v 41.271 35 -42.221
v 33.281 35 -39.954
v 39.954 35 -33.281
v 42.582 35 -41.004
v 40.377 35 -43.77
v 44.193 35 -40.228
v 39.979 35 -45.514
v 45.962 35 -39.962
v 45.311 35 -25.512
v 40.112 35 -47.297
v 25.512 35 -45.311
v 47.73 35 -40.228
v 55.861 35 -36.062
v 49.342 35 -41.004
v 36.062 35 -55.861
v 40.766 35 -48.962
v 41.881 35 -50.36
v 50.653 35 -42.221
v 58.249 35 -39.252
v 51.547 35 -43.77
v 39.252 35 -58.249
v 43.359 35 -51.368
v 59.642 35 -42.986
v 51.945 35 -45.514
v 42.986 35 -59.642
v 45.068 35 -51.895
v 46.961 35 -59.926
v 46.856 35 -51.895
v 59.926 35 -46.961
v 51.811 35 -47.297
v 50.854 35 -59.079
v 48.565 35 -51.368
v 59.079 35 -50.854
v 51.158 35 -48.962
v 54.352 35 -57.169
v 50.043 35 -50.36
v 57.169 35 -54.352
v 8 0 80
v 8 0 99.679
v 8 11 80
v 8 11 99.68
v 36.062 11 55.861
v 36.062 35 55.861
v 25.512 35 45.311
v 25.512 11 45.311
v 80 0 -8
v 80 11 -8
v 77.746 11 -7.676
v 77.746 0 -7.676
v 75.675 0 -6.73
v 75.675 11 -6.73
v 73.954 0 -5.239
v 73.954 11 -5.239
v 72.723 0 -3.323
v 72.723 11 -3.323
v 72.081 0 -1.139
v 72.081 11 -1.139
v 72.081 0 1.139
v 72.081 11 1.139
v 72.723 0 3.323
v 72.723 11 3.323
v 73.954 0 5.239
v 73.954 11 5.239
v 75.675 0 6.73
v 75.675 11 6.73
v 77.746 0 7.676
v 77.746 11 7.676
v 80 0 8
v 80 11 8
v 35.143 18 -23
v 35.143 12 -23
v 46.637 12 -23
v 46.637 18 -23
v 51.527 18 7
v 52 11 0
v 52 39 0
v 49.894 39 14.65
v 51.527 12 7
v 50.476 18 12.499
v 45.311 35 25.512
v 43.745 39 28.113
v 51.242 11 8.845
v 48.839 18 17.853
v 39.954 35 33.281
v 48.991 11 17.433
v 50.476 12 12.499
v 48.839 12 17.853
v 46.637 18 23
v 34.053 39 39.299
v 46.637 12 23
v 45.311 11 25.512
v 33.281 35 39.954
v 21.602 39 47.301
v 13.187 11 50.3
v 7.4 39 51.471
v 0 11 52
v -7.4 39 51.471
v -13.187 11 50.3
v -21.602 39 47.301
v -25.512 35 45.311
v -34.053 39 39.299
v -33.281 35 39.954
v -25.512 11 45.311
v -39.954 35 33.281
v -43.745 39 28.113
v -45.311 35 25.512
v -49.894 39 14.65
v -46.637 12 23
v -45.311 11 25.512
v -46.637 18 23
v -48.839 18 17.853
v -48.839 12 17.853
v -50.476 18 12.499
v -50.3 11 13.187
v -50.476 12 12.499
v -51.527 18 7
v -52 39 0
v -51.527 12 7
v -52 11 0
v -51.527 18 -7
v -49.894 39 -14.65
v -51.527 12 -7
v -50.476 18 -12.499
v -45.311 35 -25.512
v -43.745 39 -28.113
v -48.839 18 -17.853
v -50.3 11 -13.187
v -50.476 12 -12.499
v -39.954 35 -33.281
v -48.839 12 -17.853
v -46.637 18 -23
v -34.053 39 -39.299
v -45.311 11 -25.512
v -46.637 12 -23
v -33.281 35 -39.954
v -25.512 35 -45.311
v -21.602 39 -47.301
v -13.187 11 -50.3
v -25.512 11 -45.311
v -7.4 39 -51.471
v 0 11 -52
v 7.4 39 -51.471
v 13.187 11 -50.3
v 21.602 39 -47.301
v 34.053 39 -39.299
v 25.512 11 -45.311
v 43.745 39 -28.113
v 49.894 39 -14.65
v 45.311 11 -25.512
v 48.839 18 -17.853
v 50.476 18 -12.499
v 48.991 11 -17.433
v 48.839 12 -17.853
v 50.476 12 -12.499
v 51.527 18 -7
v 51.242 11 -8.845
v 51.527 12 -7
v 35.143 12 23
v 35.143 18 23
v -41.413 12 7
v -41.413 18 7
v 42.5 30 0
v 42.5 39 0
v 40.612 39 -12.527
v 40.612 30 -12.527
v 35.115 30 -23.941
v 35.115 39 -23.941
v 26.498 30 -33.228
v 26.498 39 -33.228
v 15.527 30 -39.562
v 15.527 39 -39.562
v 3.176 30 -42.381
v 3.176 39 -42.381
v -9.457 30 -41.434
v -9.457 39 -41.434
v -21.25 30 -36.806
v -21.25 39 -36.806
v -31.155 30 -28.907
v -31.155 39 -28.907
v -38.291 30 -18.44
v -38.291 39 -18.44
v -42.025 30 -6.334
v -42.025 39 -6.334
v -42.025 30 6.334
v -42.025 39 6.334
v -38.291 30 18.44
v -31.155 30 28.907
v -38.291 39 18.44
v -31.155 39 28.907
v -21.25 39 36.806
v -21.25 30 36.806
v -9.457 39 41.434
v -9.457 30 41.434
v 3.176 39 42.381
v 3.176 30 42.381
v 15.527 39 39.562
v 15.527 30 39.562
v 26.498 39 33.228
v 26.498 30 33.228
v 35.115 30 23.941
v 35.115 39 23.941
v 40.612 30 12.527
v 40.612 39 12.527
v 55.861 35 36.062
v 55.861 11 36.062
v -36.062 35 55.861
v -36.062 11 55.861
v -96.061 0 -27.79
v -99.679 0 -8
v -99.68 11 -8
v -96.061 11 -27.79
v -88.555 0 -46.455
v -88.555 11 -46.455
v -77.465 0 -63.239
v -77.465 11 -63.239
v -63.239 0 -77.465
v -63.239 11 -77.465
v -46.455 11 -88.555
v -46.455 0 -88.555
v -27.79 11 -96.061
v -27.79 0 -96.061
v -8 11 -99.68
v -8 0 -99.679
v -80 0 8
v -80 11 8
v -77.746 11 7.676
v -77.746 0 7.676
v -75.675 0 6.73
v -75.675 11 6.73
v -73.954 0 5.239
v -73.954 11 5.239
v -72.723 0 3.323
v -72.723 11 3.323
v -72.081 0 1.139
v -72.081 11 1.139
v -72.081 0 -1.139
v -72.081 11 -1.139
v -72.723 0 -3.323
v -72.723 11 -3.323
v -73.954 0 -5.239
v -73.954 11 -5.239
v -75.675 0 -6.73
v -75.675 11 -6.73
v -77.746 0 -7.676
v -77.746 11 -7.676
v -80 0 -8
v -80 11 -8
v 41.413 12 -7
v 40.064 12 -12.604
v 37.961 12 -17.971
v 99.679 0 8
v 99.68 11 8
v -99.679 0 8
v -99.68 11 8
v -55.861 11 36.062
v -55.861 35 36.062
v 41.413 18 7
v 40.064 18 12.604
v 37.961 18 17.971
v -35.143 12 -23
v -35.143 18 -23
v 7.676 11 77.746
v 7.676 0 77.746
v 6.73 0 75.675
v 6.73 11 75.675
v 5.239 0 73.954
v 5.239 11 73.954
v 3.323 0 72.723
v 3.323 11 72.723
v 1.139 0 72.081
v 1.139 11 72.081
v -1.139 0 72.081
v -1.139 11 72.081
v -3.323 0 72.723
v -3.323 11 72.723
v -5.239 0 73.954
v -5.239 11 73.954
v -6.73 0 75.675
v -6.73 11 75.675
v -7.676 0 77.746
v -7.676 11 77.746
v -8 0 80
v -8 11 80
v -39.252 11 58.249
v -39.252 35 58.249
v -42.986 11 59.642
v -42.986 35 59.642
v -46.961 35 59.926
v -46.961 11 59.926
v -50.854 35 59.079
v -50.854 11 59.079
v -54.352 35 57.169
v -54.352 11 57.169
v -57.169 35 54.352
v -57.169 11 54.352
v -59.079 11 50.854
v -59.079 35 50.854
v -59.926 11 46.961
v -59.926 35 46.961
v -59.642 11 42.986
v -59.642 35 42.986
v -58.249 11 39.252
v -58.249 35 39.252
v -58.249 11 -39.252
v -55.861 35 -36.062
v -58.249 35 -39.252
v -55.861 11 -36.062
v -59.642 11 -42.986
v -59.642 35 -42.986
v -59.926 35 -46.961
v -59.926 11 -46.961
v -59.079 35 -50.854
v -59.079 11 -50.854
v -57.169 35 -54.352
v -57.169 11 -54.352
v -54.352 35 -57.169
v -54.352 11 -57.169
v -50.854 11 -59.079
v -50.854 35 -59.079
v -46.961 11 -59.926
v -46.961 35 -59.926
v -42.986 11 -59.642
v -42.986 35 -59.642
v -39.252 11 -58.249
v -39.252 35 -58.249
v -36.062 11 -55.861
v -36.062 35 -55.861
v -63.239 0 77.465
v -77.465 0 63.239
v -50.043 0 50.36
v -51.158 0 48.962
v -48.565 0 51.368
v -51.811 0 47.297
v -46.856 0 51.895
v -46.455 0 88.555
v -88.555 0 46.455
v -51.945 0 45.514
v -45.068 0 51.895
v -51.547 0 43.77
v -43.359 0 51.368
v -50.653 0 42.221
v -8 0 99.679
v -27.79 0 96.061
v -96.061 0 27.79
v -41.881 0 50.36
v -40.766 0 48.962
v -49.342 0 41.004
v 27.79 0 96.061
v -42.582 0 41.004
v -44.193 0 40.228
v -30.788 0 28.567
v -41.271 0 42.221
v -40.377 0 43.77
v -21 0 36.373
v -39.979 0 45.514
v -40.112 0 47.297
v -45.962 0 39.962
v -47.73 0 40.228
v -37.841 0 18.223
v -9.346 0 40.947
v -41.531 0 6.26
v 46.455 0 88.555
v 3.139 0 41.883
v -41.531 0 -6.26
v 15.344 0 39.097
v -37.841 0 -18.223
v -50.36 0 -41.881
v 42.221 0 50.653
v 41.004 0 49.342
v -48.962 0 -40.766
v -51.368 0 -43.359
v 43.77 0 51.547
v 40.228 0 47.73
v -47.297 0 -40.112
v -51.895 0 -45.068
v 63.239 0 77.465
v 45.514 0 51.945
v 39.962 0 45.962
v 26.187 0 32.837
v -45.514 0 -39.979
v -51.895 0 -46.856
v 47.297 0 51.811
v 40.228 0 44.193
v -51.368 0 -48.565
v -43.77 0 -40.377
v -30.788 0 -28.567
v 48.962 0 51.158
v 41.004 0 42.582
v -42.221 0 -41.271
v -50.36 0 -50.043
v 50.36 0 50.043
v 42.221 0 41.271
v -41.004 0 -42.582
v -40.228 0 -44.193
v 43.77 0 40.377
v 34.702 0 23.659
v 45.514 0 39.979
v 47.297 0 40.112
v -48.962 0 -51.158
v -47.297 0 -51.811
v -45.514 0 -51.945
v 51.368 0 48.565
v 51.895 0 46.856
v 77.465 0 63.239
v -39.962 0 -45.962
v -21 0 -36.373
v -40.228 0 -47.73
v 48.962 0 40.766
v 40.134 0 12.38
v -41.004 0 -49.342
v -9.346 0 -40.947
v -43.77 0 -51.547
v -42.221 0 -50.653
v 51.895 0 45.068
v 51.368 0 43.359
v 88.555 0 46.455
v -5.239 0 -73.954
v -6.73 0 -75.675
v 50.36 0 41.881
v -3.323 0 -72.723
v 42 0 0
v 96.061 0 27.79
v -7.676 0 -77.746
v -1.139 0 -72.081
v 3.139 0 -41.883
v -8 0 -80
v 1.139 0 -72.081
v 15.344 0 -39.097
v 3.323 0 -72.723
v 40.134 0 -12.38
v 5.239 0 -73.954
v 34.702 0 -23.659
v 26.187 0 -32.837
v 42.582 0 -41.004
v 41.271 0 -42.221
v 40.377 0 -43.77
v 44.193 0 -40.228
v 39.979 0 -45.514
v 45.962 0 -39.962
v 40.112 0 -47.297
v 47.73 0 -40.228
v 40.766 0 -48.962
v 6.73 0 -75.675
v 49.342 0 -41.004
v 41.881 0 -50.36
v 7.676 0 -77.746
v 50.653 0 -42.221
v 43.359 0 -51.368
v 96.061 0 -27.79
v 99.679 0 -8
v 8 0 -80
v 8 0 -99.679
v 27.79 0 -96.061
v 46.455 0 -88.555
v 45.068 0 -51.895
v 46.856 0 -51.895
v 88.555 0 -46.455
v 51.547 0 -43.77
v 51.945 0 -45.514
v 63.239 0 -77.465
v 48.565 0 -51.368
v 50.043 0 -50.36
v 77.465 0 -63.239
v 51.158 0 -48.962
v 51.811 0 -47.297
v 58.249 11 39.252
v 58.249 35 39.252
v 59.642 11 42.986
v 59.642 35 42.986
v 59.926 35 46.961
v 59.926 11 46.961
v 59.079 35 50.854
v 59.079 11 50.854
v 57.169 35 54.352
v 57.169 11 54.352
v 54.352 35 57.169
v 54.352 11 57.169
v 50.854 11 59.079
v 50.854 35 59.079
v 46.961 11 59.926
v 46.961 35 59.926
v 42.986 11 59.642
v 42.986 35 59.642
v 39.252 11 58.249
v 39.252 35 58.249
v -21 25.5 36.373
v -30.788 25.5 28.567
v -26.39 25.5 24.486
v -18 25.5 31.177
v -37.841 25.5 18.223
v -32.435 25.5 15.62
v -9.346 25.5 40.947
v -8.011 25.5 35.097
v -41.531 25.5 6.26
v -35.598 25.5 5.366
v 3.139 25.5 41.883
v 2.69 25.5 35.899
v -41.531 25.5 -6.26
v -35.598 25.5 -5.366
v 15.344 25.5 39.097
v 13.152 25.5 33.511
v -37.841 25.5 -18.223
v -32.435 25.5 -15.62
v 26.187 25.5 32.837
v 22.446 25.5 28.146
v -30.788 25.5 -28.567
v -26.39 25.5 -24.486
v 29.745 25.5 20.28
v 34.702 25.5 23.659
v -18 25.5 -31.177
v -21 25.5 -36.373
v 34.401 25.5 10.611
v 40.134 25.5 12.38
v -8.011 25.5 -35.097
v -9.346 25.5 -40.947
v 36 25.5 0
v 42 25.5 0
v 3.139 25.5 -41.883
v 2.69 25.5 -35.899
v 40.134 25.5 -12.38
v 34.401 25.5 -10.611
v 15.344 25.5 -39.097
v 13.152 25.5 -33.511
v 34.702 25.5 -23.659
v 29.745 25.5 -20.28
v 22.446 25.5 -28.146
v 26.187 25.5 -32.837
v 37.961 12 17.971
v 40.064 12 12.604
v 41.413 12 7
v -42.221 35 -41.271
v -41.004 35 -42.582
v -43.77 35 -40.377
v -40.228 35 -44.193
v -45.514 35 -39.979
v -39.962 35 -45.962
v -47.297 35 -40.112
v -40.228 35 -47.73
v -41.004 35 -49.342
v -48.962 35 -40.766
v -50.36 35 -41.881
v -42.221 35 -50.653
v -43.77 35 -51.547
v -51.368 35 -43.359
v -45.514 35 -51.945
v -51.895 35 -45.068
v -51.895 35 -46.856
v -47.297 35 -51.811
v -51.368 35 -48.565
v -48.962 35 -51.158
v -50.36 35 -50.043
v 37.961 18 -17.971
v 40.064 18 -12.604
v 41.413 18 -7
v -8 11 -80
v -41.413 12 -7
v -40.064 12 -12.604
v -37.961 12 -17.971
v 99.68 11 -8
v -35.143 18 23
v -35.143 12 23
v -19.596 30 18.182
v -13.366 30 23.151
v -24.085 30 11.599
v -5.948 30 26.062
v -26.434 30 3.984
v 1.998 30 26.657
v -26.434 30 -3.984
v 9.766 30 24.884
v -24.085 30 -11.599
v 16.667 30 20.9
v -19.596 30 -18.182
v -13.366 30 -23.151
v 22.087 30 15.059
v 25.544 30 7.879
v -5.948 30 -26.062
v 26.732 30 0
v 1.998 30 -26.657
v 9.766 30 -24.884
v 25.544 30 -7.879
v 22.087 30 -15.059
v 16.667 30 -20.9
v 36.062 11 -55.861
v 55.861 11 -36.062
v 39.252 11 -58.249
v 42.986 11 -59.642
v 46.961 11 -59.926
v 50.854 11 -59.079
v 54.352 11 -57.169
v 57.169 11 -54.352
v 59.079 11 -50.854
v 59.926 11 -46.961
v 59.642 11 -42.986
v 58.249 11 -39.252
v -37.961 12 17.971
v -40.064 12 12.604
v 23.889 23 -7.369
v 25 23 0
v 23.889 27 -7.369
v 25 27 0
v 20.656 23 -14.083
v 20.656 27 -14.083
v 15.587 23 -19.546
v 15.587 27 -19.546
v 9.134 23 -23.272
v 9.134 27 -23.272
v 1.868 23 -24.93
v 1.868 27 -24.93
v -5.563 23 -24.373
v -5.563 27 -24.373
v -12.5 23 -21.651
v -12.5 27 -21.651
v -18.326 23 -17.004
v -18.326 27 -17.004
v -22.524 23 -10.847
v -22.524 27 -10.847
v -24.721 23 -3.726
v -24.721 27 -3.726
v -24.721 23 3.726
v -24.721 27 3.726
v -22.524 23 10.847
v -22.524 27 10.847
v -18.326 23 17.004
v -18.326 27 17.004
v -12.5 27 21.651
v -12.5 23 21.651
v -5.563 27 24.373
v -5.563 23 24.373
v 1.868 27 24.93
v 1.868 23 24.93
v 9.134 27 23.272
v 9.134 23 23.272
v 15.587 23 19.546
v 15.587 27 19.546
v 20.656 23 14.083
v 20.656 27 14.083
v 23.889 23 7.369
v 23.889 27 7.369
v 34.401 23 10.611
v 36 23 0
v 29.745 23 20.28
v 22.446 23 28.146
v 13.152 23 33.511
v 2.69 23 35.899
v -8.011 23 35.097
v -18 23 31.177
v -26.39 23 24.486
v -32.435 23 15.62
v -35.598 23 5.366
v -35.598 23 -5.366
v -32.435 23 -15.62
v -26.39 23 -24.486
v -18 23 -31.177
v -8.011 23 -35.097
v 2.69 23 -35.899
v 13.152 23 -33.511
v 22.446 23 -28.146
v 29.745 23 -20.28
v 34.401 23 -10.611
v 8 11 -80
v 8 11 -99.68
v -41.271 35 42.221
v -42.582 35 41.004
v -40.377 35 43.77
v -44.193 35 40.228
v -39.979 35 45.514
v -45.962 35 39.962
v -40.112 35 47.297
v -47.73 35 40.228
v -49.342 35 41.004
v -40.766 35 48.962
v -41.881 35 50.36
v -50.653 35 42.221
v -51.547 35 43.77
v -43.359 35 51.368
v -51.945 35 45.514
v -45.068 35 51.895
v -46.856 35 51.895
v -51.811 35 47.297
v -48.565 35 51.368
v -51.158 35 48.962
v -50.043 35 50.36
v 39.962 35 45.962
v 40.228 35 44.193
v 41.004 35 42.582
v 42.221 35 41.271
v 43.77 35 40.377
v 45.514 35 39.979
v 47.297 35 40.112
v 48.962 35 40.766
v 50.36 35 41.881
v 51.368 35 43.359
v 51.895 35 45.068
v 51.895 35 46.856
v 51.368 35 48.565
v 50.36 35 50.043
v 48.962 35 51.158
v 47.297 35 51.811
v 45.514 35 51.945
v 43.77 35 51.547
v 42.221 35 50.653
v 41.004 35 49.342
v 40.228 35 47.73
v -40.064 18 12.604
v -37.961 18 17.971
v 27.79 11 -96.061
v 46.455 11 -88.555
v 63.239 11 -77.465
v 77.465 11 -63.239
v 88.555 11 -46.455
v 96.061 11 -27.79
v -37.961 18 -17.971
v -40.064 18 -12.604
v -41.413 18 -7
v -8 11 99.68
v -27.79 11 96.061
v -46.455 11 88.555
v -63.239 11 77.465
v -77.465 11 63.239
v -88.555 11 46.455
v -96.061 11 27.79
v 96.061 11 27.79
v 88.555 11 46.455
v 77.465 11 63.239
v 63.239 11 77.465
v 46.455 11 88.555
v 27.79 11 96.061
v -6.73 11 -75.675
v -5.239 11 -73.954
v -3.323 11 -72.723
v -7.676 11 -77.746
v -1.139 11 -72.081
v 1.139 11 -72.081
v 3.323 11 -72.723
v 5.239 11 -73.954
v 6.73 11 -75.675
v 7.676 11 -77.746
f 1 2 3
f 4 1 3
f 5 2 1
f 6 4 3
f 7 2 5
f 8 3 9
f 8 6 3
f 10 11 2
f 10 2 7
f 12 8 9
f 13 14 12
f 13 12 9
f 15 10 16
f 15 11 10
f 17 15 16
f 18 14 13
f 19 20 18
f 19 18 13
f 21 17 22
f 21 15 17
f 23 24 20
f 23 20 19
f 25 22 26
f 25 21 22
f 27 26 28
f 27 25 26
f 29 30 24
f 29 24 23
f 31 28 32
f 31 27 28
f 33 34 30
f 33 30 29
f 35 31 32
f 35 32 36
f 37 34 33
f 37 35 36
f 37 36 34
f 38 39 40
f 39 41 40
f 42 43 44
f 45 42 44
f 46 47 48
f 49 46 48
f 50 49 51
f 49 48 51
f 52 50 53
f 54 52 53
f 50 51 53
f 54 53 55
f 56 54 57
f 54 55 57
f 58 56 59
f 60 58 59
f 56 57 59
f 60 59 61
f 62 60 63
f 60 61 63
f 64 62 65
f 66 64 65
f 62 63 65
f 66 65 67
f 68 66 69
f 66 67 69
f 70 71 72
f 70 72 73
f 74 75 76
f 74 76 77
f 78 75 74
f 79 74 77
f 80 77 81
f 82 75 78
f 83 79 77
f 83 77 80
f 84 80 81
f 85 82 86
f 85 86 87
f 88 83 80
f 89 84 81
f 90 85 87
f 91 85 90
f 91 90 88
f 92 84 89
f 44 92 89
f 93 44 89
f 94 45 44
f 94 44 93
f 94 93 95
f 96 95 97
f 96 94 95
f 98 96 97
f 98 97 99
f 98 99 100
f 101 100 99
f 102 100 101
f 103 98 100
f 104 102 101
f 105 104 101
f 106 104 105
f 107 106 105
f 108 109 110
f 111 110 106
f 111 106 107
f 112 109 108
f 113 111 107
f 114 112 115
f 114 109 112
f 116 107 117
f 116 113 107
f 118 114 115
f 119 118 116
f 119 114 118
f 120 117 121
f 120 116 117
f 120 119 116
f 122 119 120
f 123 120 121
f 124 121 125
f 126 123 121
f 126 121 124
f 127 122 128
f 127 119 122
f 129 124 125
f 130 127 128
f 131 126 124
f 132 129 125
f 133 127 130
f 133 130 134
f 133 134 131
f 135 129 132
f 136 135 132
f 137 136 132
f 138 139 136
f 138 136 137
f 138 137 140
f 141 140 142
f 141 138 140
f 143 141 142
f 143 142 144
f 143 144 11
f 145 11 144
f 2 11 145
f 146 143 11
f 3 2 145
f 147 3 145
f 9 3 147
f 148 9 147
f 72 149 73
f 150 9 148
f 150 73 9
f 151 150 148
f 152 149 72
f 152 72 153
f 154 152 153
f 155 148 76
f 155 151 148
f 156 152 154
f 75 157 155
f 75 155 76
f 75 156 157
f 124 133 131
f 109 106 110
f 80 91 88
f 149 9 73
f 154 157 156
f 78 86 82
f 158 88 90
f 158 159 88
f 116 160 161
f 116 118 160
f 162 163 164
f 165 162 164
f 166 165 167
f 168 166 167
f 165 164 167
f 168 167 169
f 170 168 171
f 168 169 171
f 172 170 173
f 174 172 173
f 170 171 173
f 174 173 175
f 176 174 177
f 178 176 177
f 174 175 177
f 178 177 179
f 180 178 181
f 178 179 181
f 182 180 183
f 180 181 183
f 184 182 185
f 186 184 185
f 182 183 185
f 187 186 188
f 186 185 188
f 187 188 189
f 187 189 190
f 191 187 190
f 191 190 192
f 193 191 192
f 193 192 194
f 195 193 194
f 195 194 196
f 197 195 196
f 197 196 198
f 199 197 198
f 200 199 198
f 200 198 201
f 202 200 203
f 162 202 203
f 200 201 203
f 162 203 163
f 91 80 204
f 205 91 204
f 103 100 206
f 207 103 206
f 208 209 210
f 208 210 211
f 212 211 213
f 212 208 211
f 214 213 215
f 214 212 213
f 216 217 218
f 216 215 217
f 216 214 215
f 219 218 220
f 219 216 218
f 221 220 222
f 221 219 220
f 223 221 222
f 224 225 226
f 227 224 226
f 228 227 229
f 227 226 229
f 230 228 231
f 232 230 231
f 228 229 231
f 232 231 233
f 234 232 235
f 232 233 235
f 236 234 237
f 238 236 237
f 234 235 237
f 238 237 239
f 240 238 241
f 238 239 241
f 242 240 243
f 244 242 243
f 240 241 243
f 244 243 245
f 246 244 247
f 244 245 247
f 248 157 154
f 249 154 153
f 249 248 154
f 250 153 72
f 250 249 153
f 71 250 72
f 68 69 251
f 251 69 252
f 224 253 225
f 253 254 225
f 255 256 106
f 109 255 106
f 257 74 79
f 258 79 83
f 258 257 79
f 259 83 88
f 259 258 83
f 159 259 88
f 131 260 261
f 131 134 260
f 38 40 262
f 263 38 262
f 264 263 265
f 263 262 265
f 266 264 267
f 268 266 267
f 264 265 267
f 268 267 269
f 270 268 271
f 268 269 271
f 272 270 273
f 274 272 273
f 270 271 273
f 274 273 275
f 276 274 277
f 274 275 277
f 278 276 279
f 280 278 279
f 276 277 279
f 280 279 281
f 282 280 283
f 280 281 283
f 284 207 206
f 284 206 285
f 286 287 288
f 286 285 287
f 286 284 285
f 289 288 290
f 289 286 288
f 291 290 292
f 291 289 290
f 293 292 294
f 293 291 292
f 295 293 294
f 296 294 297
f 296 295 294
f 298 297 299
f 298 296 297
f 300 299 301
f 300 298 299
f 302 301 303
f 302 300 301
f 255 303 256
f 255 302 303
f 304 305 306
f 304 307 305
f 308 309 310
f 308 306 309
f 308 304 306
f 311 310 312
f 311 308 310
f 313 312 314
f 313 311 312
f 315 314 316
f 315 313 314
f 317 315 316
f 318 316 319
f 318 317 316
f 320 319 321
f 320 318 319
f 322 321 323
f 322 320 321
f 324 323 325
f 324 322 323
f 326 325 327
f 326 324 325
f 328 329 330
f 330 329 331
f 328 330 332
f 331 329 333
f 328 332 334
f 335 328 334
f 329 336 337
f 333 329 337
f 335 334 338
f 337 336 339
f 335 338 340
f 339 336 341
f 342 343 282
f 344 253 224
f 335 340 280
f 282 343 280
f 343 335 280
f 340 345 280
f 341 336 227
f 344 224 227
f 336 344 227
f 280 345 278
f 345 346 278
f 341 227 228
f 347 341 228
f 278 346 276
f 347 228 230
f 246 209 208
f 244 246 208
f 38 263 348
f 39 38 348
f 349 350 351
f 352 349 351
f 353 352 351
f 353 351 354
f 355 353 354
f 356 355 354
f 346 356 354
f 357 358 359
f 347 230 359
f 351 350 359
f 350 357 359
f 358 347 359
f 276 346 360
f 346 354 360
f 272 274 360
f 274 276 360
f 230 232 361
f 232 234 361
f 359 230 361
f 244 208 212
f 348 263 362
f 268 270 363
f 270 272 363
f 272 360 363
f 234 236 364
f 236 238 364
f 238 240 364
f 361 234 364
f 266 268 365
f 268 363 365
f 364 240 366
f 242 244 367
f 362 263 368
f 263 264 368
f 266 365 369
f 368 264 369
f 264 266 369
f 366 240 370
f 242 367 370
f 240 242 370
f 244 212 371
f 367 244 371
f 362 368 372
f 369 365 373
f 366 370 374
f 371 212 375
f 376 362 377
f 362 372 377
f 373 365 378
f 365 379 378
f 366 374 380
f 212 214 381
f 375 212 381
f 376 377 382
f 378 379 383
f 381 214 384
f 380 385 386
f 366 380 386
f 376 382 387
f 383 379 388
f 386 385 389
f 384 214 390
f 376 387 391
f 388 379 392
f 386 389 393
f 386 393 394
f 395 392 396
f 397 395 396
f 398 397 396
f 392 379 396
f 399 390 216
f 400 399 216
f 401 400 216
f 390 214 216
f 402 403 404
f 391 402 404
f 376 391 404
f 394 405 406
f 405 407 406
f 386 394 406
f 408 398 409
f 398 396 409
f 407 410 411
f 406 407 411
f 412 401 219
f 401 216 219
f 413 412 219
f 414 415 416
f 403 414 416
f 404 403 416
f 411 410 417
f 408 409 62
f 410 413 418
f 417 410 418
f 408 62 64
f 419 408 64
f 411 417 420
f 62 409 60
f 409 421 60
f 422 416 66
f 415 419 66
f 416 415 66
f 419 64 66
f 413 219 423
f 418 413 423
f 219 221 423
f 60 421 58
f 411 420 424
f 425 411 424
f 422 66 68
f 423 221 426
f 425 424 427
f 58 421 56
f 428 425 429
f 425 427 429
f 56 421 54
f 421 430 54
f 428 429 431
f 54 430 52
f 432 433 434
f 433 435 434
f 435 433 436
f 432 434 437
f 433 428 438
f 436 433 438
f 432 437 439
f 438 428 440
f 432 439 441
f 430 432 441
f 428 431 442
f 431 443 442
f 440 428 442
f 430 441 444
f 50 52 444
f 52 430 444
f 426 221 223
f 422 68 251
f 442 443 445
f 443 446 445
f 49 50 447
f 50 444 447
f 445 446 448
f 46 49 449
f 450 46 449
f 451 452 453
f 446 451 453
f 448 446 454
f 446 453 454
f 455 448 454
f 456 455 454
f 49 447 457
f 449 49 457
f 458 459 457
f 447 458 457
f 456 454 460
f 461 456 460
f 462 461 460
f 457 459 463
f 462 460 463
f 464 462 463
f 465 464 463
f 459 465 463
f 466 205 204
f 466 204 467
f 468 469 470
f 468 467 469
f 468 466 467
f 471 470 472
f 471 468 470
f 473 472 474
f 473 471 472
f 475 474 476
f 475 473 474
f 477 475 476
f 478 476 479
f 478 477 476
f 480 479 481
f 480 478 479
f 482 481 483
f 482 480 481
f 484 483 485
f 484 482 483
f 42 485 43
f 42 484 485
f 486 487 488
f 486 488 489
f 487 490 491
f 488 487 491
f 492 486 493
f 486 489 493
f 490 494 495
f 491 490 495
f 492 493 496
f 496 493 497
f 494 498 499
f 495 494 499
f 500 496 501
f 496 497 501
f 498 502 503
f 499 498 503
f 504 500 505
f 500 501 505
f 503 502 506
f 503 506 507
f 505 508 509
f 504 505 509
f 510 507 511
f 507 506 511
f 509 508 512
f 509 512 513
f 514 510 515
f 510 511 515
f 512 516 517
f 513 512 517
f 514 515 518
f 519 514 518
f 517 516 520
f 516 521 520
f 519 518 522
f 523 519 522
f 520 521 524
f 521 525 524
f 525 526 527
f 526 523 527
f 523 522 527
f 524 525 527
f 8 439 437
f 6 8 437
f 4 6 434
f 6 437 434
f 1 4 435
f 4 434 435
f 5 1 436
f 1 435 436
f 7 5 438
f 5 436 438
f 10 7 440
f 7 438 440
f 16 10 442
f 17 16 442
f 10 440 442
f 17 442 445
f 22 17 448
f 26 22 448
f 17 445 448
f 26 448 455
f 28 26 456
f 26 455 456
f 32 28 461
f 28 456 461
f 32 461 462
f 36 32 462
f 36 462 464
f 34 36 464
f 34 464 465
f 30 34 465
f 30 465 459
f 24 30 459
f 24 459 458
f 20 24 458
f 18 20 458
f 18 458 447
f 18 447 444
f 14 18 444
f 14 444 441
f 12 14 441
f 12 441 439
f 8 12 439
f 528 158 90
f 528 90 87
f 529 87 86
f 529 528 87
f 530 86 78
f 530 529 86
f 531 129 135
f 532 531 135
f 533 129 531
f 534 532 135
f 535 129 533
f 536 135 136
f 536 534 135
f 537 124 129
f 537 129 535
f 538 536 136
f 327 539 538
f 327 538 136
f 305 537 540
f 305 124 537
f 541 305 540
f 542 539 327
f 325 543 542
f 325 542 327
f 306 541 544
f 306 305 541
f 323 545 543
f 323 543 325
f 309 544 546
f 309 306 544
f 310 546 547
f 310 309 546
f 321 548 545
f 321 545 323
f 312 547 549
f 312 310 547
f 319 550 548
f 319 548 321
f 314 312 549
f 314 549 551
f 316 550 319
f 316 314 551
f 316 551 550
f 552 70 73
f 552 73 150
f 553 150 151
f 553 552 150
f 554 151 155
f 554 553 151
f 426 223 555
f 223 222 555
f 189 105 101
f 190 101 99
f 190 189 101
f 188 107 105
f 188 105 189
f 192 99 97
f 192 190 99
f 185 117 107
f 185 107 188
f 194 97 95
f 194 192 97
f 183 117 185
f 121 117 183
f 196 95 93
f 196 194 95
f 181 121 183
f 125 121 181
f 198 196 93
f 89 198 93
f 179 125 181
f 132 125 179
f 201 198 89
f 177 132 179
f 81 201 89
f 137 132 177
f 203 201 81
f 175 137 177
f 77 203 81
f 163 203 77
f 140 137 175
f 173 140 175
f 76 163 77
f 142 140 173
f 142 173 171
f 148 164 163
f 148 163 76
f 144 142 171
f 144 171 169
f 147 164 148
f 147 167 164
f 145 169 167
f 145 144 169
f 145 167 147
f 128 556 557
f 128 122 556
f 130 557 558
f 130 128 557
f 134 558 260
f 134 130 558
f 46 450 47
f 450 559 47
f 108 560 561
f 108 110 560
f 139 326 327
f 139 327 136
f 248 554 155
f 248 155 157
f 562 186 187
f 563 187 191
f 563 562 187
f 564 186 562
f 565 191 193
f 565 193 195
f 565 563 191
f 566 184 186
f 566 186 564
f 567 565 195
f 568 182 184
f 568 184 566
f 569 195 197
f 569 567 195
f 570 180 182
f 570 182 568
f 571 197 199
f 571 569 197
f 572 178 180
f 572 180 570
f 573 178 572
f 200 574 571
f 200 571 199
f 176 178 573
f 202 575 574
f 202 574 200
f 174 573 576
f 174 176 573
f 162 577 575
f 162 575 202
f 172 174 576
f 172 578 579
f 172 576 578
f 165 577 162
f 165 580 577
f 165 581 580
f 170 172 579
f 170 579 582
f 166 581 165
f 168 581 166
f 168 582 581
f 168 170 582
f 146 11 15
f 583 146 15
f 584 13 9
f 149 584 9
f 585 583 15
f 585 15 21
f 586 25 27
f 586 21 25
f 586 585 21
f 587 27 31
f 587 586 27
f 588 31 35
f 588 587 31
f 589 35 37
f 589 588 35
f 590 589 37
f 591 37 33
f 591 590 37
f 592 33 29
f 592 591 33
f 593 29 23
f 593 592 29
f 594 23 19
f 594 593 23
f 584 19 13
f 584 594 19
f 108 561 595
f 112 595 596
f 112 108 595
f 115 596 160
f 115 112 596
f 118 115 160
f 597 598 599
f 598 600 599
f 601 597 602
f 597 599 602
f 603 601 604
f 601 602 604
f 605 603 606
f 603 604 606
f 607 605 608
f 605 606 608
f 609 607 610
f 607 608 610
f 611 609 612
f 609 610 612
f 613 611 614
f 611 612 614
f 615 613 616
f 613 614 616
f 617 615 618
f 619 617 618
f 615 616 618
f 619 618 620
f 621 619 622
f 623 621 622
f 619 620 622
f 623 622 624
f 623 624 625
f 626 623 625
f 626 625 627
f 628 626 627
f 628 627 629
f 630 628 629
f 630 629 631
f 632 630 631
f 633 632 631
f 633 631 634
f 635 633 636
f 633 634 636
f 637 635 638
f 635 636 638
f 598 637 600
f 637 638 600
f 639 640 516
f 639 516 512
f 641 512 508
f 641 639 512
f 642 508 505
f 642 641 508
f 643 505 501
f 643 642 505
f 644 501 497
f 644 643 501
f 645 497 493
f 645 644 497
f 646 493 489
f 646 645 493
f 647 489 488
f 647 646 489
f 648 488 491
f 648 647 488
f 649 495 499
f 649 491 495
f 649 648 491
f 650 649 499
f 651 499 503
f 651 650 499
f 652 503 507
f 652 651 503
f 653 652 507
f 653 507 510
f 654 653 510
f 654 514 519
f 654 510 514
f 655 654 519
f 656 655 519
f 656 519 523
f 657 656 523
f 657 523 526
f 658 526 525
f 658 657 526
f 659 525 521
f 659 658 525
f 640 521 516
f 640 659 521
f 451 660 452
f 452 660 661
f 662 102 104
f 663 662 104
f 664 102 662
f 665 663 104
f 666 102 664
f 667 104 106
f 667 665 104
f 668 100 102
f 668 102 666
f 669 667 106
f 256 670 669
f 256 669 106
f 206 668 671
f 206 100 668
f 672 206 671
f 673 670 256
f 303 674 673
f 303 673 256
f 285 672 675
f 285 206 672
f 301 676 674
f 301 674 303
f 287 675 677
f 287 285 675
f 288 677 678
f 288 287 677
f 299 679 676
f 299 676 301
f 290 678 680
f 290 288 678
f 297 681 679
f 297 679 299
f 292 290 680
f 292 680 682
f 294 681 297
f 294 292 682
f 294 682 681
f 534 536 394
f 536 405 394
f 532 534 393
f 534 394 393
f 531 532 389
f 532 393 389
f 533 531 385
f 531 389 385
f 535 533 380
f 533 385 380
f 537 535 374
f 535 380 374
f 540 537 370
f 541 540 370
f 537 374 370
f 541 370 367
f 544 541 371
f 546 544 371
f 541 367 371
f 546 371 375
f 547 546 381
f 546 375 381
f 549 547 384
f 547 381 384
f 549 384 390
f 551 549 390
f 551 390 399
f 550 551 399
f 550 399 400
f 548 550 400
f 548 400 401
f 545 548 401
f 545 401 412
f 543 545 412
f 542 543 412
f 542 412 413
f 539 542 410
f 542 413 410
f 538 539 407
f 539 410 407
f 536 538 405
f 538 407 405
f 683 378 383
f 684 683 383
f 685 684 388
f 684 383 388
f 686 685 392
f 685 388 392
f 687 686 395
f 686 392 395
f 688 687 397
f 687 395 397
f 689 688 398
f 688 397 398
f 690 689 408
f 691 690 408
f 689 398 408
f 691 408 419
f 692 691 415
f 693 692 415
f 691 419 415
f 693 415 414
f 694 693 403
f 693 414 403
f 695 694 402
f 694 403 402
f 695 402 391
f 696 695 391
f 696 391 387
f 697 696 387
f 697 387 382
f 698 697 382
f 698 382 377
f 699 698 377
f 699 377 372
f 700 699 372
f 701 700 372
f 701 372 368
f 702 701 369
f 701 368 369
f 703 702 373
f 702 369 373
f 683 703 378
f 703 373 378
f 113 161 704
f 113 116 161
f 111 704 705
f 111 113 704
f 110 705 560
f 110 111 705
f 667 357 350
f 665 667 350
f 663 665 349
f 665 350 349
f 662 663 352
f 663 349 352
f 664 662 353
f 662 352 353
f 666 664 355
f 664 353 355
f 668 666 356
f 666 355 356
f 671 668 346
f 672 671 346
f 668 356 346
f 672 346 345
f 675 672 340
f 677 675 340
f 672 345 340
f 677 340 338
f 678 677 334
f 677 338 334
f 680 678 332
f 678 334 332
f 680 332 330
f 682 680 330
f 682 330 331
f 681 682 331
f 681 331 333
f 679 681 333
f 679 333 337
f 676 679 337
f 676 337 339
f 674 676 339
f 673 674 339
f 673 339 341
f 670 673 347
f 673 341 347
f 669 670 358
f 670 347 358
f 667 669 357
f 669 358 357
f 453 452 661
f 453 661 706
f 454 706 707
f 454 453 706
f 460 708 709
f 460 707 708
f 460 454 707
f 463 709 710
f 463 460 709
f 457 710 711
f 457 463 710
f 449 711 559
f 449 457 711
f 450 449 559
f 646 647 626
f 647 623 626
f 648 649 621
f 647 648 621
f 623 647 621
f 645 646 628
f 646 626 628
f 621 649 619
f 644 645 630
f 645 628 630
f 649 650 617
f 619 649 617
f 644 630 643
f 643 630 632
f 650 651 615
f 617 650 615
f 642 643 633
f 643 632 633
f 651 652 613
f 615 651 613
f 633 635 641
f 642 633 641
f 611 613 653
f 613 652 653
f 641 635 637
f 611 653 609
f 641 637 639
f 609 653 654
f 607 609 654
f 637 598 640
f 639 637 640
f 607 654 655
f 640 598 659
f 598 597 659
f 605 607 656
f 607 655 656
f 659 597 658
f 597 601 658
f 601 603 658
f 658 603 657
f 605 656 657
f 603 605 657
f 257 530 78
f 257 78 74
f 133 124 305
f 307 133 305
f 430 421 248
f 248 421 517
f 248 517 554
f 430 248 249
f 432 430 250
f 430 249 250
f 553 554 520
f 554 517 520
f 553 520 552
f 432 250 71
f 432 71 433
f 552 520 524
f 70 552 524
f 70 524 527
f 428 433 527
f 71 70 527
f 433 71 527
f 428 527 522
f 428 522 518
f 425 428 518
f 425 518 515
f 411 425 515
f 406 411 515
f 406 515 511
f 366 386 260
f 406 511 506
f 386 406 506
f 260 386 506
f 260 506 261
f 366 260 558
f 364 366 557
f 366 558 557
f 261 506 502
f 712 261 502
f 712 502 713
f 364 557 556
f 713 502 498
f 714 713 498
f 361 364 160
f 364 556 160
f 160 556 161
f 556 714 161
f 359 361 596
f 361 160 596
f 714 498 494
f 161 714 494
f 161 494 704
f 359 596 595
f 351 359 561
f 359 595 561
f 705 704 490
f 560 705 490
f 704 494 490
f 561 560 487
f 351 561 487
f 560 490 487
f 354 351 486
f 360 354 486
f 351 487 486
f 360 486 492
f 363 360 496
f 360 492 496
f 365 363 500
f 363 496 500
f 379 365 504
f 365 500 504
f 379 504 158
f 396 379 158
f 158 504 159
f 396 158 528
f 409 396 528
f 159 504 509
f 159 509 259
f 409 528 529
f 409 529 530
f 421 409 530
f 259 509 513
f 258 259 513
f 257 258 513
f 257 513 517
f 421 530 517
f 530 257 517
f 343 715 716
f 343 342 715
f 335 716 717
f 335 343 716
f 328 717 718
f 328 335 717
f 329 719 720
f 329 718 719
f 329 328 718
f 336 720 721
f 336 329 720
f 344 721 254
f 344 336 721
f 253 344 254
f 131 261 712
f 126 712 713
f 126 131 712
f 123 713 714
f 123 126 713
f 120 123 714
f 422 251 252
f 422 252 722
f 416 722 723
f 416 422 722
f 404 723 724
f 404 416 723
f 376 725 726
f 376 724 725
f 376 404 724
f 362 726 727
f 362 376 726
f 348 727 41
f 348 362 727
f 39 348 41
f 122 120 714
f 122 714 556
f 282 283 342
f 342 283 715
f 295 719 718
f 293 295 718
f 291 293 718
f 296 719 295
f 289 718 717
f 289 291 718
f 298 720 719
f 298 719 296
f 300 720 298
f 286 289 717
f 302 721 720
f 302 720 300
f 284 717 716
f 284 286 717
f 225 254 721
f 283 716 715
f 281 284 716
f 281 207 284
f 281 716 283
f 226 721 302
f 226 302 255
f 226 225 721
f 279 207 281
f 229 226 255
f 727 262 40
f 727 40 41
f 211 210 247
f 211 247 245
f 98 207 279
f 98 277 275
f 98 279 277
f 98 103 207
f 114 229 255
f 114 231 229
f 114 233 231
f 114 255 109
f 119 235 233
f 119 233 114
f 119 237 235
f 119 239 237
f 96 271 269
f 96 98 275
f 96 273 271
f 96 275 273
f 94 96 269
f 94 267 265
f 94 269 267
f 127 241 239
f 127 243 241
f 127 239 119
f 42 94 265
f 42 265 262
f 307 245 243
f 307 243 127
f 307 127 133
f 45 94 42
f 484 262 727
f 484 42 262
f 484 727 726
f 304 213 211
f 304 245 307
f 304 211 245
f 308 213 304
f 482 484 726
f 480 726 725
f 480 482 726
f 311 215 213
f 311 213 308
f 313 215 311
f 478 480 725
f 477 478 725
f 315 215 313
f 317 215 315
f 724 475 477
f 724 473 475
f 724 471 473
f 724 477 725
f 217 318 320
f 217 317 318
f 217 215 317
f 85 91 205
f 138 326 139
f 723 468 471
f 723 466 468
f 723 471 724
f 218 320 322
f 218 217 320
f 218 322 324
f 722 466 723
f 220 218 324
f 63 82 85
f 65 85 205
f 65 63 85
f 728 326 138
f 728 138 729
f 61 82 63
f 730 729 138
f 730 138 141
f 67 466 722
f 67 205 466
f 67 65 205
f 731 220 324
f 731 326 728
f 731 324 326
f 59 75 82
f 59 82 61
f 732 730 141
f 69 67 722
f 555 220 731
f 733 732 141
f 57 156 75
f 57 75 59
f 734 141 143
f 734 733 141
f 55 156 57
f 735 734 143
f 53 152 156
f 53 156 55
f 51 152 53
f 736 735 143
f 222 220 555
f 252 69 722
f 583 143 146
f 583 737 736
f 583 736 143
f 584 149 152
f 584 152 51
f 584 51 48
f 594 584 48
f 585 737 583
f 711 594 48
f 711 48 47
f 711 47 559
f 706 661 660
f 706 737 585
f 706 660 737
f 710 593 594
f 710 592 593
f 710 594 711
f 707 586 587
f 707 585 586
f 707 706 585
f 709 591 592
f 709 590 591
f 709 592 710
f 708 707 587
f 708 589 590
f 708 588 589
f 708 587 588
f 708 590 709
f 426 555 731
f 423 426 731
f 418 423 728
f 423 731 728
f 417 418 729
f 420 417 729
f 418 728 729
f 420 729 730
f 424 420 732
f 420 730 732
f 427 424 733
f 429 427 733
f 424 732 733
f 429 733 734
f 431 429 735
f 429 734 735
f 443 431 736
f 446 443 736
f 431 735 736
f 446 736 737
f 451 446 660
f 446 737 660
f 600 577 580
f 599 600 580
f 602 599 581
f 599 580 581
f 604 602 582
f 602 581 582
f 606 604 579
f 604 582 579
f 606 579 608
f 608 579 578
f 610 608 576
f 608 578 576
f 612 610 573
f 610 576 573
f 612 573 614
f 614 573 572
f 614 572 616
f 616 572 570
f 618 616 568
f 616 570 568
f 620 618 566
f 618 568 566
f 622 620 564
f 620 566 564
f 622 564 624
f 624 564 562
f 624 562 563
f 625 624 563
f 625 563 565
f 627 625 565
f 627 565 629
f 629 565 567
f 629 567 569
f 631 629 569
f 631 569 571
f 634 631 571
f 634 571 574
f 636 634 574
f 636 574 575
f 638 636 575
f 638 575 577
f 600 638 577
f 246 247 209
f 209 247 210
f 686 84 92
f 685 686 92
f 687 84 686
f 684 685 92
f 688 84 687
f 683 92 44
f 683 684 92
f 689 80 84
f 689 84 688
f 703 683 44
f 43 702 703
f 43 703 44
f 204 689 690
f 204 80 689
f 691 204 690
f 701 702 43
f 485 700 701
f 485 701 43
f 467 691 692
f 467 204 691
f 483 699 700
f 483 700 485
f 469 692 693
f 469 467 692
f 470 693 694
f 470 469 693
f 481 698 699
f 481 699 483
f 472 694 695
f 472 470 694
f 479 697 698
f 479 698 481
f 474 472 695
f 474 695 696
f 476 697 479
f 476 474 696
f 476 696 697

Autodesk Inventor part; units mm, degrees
ref_plane "YZ Plane" through (0, 0, 0) normal (1, 0, 0) x (0, 1, 0)
ref_plane "XZ Plane" through (0, 0, 0) normal (0, 1, 0) x (-1, 0, 0)
ref_plane "XY Plane" through (0, 0, 0) normal (0, 0, 1) x (1, 0, 0)
sketch "Sketch1" plane through (0, 0, 0) normal (0, 0, 1) x (1, 0, 0)
  line L0 (0, 0) -> (0, 39)
  line L1 (42, 0) -> (42, 25.5)
  line L2 (42, 25.5) -> (36, 25.5)
  line L3 (36, 25.5) -> (36, 23)
  line L4 (36, 23) -> (25, 23)
  line L5 (25, 23) -> (25, 27)
  line L6 (25, 27) -> (26.7321, 30)
  line L7 (26.7321, 30) -> (42.5, 30)
  line L8 (42.5, 30) -> (42.5, 39)
  line L9 (42.5, 39) -> (52, 39)
  line L10 (52, 39) -> (52, 11)
  line L11 (52, 11) -> (100, 11)
  line L12 (100, 11) -> (100, 0)
  line L13 (100, 0) -> (42, 0)
  dimension "d0" = 39
  dimension "d1" = 200
  dimension "d2" = 84
  dimension "d3" = 85
  dimension "d4" = 11
  dimension "d5" = 50
  dimension "d6" = 72
  dimension "d7" = 23
  dimension "d8" = 30
  dimension "d9" = 30
  dimension "d10" = 25.5
  dimension "d11" = 104
  dimension "d12" = 3
revolve "Revolution1" add sketch "Sketch1" angle 360 about axis through (0, 0, 0) along (0, 1, 0)
sketch "Sketch2" plane through (0, 0, 0) normal (1, 0, 0) x (0, 1, 0)
  line L0 (18, 23) -> (12, 23)
  line L1 (12, 23) -> (12, 7)
  line L2 (12, 7) -> (18, 7)
  line L3 (18, 7) -> (18, 23)
  line L4 (0, -42) -> (0, 42) projected
  point P0 (0, 0)
  point P1 (0, 0)
  dimension "d14" = 12
  dimension "d15" = 6
  dimension "d16" = 16
  dimension "d17" = 7
extrude "Extrusion1" cut sketch "Sketch2" along normal through all both and the other way through all
mirror "Mirror1" about plane through (0, 0, 0) normal (0, 0, 1) of "Extrusion1"
sketch "Sketch3" plane through (0, 11, 0) normal (0, 1, 0) x (1, 0, 0)
  circle A0 centre (0, 0) radius 52 projected
  circle A1 centre (0, 0) radius 100 projected
  line L0 (99.6795, 8) -> (80, 8)
  arc A2 (80, 8) -> (80, -8) centre (80, 0) ccw
  line L1 (80, -8) -> (99.6795, -8)
  arc A3 (99.6795, -8) -> (99.6795, 8) centre (0, 0) ccw
  dimension "d20" = 8
  dimension "d21" = 80
extrude "Extrusion2" cut sketch "Sketch3" against normal through all contours A1 L1 A2 L0 picked at (86.6667, 0)
sketch "Sketch4" plane through (80, 11, -8) normal (0, 1, 0) x (1, 0, 0)
  circle A0 centre (-80, -8) radius 52 projected
  line L0 (-80, -8) -> (-34.0381, 37.9619) construction
  line L1 (-80, -8) -> (-15, -8) construction
  line L2 (-54.4876, 37.3114) -> (-43.9376, 47.8614)
  arc A1 (-24.1386, 28.0624) -> (-43.9376, 47.8614) centre (-34.0381, 37.9619) ccw
  line L3 (-24.1386, 28.0624) -> (-34.6886, 17.5124)
  dimension "d24" = 65
  dimension "d25" = 45
  dimension "d26" = 14
extrude "Extrusion3" add sketch "Sketch4" along normal blind 24 contours A0 L2 A1 L3
sketch "Sketch5" plane through (80, 35, -8) normal (0, 1, 0) x (1, 0, 0)
  arc A0 (-24.1386, 28.0624) -> (-43.9376, 47.8614) centre (-34.0381, 37.9619) ccw projected
  point P0 (-80, -8)
hole "Hole1" at (45.9619, 35, -45.9619) direction (0, -1, 0) diameter 12 end through all
pattern_circular "Circular Pattern1" count 4 over 360 about axis through (0, 5.5, 0) along (0, 1, 0) of "Extrusion2", "Extrusion3", "Hole1"
properties part number "Part038. Flat stand" material "Steel, Carbon"
